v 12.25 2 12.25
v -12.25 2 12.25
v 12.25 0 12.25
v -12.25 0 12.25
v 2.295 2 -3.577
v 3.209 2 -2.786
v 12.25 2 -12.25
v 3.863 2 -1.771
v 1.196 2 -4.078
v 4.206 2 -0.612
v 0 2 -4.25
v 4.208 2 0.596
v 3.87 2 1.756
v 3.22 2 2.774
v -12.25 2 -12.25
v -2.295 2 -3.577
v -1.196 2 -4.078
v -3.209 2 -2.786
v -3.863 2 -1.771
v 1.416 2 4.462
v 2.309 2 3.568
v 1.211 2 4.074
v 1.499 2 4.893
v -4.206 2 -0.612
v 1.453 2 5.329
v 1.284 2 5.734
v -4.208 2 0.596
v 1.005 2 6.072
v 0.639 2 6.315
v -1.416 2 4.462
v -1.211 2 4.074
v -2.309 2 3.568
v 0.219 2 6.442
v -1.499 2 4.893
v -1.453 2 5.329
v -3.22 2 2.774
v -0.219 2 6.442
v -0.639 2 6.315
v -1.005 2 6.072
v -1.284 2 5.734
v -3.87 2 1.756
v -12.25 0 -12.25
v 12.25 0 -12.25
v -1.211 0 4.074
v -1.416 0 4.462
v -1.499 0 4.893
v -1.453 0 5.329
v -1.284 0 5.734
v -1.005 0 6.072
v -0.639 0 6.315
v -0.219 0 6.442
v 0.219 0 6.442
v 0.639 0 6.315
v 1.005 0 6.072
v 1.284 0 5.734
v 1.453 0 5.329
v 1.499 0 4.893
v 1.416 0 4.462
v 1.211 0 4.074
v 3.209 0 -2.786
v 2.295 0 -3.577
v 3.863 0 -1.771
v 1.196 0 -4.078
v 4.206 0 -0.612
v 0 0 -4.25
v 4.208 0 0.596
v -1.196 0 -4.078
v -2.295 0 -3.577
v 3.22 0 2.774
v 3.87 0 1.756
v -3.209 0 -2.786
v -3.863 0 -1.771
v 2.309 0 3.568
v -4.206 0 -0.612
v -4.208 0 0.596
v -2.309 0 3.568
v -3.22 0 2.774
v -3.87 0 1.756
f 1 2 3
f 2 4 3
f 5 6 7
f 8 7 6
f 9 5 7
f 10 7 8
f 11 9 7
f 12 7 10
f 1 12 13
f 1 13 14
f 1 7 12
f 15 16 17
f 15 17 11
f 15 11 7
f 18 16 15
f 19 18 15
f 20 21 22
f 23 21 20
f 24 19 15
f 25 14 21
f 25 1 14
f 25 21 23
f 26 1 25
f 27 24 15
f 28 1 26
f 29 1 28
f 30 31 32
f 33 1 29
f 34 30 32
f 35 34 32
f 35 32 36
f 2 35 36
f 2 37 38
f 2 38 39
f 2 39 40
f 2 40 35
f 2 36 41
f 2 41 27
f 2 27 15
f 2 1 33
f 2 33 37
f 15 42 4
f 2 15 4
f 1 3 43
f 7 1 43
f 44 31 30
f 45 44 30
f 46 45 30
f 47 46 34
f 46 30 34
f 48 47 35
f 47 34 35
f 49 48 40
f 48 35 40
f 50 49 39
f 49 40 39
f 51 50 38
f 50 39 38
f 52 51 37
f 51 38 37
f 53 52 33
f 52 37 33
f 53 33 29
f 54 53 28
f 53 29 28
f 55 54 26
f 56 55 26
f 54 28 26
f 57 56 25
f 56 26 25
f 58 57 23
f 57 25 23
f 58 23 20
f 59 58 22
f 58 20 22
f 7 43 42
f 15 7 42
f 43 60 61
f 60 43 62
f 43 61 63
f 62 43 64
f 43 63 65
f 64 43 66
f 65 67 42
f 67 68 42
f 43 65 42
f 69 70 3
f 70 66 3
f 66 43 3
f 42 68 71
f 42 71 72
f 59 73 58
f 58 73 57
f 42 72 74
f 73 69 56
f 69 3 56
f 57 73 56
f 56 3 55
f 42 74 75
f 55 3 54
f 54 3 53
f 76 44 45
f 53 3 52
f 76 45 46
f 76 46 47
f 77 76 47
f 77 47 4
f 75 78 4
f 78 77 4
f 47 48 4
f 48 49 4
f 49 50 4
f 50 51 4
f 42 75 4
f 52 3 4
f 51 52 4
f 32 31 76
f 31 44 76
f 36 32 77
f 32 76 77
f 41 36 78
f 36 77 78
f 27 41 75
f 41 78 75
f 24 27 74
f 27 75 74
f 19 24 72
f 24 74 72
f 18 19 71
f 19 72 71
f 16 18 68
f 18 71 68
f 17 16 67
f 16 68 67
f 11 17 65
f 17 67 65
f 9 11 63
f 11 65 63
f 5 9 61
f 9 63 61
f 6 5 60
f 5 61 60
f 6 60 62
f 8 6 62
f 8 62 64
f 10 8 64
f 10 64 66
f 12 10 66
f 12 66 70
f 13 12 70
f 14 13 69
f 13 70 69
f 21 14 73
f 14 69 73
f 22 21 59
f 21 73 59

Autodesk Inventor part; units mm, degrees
ref_plane "YZ Plane" through (0, 0, 0) normal (1, 0, 0) x (0, 1, 0)
ref_plane "XZ Plane" through (0, 0, 0) normal (0, 1, 0) x (-1, 0, 0)
ref_plane "XY Plane" through (0, 0, 0) normal (0, 0, 1) x (1, 0, 0)
sketch "Sketch1" plane through (0, 0, 0) normal (0, 1, 0) x (-1, 0, 0)
  circle A0 centre (0, 0) radius 4.25
  line L0 (-12.25, -12.25) -> (12.25, -12.25)
  line L1 (12.25, -12.25) -> (12.25, 12.25)
  line L2 (12.25, 12.25) -> (-12.25, 12.25)
  line L3 (-12.25, 12.25) -> (-12.25, -12.25)
  line L4 (-12.25, -12.25) -> (12.25, 12.25) construction
  line L5 (12.25, -12.25) -> (-12.25, 12.25) construction
  dimension "d0" = 24.5
  dimension "d1" = 8.5
extrude "Extrusion1" add sketch "Sketch1" along normal blind 2
sketch "Sketch2" plane through (0, 2, 0) normal (0, 1, 0) x (1, 0, 0)
  circle A0 centre (0, -4.9582) radius 1.5
  point P0 (0, 0)
  dimension "d4" = 3
extrude "Extrusion2" cut sketch "Sketch2" against normal blind 3
equation "\"d5\" = d4"
properties part number "pb_hole" material "Lead"
